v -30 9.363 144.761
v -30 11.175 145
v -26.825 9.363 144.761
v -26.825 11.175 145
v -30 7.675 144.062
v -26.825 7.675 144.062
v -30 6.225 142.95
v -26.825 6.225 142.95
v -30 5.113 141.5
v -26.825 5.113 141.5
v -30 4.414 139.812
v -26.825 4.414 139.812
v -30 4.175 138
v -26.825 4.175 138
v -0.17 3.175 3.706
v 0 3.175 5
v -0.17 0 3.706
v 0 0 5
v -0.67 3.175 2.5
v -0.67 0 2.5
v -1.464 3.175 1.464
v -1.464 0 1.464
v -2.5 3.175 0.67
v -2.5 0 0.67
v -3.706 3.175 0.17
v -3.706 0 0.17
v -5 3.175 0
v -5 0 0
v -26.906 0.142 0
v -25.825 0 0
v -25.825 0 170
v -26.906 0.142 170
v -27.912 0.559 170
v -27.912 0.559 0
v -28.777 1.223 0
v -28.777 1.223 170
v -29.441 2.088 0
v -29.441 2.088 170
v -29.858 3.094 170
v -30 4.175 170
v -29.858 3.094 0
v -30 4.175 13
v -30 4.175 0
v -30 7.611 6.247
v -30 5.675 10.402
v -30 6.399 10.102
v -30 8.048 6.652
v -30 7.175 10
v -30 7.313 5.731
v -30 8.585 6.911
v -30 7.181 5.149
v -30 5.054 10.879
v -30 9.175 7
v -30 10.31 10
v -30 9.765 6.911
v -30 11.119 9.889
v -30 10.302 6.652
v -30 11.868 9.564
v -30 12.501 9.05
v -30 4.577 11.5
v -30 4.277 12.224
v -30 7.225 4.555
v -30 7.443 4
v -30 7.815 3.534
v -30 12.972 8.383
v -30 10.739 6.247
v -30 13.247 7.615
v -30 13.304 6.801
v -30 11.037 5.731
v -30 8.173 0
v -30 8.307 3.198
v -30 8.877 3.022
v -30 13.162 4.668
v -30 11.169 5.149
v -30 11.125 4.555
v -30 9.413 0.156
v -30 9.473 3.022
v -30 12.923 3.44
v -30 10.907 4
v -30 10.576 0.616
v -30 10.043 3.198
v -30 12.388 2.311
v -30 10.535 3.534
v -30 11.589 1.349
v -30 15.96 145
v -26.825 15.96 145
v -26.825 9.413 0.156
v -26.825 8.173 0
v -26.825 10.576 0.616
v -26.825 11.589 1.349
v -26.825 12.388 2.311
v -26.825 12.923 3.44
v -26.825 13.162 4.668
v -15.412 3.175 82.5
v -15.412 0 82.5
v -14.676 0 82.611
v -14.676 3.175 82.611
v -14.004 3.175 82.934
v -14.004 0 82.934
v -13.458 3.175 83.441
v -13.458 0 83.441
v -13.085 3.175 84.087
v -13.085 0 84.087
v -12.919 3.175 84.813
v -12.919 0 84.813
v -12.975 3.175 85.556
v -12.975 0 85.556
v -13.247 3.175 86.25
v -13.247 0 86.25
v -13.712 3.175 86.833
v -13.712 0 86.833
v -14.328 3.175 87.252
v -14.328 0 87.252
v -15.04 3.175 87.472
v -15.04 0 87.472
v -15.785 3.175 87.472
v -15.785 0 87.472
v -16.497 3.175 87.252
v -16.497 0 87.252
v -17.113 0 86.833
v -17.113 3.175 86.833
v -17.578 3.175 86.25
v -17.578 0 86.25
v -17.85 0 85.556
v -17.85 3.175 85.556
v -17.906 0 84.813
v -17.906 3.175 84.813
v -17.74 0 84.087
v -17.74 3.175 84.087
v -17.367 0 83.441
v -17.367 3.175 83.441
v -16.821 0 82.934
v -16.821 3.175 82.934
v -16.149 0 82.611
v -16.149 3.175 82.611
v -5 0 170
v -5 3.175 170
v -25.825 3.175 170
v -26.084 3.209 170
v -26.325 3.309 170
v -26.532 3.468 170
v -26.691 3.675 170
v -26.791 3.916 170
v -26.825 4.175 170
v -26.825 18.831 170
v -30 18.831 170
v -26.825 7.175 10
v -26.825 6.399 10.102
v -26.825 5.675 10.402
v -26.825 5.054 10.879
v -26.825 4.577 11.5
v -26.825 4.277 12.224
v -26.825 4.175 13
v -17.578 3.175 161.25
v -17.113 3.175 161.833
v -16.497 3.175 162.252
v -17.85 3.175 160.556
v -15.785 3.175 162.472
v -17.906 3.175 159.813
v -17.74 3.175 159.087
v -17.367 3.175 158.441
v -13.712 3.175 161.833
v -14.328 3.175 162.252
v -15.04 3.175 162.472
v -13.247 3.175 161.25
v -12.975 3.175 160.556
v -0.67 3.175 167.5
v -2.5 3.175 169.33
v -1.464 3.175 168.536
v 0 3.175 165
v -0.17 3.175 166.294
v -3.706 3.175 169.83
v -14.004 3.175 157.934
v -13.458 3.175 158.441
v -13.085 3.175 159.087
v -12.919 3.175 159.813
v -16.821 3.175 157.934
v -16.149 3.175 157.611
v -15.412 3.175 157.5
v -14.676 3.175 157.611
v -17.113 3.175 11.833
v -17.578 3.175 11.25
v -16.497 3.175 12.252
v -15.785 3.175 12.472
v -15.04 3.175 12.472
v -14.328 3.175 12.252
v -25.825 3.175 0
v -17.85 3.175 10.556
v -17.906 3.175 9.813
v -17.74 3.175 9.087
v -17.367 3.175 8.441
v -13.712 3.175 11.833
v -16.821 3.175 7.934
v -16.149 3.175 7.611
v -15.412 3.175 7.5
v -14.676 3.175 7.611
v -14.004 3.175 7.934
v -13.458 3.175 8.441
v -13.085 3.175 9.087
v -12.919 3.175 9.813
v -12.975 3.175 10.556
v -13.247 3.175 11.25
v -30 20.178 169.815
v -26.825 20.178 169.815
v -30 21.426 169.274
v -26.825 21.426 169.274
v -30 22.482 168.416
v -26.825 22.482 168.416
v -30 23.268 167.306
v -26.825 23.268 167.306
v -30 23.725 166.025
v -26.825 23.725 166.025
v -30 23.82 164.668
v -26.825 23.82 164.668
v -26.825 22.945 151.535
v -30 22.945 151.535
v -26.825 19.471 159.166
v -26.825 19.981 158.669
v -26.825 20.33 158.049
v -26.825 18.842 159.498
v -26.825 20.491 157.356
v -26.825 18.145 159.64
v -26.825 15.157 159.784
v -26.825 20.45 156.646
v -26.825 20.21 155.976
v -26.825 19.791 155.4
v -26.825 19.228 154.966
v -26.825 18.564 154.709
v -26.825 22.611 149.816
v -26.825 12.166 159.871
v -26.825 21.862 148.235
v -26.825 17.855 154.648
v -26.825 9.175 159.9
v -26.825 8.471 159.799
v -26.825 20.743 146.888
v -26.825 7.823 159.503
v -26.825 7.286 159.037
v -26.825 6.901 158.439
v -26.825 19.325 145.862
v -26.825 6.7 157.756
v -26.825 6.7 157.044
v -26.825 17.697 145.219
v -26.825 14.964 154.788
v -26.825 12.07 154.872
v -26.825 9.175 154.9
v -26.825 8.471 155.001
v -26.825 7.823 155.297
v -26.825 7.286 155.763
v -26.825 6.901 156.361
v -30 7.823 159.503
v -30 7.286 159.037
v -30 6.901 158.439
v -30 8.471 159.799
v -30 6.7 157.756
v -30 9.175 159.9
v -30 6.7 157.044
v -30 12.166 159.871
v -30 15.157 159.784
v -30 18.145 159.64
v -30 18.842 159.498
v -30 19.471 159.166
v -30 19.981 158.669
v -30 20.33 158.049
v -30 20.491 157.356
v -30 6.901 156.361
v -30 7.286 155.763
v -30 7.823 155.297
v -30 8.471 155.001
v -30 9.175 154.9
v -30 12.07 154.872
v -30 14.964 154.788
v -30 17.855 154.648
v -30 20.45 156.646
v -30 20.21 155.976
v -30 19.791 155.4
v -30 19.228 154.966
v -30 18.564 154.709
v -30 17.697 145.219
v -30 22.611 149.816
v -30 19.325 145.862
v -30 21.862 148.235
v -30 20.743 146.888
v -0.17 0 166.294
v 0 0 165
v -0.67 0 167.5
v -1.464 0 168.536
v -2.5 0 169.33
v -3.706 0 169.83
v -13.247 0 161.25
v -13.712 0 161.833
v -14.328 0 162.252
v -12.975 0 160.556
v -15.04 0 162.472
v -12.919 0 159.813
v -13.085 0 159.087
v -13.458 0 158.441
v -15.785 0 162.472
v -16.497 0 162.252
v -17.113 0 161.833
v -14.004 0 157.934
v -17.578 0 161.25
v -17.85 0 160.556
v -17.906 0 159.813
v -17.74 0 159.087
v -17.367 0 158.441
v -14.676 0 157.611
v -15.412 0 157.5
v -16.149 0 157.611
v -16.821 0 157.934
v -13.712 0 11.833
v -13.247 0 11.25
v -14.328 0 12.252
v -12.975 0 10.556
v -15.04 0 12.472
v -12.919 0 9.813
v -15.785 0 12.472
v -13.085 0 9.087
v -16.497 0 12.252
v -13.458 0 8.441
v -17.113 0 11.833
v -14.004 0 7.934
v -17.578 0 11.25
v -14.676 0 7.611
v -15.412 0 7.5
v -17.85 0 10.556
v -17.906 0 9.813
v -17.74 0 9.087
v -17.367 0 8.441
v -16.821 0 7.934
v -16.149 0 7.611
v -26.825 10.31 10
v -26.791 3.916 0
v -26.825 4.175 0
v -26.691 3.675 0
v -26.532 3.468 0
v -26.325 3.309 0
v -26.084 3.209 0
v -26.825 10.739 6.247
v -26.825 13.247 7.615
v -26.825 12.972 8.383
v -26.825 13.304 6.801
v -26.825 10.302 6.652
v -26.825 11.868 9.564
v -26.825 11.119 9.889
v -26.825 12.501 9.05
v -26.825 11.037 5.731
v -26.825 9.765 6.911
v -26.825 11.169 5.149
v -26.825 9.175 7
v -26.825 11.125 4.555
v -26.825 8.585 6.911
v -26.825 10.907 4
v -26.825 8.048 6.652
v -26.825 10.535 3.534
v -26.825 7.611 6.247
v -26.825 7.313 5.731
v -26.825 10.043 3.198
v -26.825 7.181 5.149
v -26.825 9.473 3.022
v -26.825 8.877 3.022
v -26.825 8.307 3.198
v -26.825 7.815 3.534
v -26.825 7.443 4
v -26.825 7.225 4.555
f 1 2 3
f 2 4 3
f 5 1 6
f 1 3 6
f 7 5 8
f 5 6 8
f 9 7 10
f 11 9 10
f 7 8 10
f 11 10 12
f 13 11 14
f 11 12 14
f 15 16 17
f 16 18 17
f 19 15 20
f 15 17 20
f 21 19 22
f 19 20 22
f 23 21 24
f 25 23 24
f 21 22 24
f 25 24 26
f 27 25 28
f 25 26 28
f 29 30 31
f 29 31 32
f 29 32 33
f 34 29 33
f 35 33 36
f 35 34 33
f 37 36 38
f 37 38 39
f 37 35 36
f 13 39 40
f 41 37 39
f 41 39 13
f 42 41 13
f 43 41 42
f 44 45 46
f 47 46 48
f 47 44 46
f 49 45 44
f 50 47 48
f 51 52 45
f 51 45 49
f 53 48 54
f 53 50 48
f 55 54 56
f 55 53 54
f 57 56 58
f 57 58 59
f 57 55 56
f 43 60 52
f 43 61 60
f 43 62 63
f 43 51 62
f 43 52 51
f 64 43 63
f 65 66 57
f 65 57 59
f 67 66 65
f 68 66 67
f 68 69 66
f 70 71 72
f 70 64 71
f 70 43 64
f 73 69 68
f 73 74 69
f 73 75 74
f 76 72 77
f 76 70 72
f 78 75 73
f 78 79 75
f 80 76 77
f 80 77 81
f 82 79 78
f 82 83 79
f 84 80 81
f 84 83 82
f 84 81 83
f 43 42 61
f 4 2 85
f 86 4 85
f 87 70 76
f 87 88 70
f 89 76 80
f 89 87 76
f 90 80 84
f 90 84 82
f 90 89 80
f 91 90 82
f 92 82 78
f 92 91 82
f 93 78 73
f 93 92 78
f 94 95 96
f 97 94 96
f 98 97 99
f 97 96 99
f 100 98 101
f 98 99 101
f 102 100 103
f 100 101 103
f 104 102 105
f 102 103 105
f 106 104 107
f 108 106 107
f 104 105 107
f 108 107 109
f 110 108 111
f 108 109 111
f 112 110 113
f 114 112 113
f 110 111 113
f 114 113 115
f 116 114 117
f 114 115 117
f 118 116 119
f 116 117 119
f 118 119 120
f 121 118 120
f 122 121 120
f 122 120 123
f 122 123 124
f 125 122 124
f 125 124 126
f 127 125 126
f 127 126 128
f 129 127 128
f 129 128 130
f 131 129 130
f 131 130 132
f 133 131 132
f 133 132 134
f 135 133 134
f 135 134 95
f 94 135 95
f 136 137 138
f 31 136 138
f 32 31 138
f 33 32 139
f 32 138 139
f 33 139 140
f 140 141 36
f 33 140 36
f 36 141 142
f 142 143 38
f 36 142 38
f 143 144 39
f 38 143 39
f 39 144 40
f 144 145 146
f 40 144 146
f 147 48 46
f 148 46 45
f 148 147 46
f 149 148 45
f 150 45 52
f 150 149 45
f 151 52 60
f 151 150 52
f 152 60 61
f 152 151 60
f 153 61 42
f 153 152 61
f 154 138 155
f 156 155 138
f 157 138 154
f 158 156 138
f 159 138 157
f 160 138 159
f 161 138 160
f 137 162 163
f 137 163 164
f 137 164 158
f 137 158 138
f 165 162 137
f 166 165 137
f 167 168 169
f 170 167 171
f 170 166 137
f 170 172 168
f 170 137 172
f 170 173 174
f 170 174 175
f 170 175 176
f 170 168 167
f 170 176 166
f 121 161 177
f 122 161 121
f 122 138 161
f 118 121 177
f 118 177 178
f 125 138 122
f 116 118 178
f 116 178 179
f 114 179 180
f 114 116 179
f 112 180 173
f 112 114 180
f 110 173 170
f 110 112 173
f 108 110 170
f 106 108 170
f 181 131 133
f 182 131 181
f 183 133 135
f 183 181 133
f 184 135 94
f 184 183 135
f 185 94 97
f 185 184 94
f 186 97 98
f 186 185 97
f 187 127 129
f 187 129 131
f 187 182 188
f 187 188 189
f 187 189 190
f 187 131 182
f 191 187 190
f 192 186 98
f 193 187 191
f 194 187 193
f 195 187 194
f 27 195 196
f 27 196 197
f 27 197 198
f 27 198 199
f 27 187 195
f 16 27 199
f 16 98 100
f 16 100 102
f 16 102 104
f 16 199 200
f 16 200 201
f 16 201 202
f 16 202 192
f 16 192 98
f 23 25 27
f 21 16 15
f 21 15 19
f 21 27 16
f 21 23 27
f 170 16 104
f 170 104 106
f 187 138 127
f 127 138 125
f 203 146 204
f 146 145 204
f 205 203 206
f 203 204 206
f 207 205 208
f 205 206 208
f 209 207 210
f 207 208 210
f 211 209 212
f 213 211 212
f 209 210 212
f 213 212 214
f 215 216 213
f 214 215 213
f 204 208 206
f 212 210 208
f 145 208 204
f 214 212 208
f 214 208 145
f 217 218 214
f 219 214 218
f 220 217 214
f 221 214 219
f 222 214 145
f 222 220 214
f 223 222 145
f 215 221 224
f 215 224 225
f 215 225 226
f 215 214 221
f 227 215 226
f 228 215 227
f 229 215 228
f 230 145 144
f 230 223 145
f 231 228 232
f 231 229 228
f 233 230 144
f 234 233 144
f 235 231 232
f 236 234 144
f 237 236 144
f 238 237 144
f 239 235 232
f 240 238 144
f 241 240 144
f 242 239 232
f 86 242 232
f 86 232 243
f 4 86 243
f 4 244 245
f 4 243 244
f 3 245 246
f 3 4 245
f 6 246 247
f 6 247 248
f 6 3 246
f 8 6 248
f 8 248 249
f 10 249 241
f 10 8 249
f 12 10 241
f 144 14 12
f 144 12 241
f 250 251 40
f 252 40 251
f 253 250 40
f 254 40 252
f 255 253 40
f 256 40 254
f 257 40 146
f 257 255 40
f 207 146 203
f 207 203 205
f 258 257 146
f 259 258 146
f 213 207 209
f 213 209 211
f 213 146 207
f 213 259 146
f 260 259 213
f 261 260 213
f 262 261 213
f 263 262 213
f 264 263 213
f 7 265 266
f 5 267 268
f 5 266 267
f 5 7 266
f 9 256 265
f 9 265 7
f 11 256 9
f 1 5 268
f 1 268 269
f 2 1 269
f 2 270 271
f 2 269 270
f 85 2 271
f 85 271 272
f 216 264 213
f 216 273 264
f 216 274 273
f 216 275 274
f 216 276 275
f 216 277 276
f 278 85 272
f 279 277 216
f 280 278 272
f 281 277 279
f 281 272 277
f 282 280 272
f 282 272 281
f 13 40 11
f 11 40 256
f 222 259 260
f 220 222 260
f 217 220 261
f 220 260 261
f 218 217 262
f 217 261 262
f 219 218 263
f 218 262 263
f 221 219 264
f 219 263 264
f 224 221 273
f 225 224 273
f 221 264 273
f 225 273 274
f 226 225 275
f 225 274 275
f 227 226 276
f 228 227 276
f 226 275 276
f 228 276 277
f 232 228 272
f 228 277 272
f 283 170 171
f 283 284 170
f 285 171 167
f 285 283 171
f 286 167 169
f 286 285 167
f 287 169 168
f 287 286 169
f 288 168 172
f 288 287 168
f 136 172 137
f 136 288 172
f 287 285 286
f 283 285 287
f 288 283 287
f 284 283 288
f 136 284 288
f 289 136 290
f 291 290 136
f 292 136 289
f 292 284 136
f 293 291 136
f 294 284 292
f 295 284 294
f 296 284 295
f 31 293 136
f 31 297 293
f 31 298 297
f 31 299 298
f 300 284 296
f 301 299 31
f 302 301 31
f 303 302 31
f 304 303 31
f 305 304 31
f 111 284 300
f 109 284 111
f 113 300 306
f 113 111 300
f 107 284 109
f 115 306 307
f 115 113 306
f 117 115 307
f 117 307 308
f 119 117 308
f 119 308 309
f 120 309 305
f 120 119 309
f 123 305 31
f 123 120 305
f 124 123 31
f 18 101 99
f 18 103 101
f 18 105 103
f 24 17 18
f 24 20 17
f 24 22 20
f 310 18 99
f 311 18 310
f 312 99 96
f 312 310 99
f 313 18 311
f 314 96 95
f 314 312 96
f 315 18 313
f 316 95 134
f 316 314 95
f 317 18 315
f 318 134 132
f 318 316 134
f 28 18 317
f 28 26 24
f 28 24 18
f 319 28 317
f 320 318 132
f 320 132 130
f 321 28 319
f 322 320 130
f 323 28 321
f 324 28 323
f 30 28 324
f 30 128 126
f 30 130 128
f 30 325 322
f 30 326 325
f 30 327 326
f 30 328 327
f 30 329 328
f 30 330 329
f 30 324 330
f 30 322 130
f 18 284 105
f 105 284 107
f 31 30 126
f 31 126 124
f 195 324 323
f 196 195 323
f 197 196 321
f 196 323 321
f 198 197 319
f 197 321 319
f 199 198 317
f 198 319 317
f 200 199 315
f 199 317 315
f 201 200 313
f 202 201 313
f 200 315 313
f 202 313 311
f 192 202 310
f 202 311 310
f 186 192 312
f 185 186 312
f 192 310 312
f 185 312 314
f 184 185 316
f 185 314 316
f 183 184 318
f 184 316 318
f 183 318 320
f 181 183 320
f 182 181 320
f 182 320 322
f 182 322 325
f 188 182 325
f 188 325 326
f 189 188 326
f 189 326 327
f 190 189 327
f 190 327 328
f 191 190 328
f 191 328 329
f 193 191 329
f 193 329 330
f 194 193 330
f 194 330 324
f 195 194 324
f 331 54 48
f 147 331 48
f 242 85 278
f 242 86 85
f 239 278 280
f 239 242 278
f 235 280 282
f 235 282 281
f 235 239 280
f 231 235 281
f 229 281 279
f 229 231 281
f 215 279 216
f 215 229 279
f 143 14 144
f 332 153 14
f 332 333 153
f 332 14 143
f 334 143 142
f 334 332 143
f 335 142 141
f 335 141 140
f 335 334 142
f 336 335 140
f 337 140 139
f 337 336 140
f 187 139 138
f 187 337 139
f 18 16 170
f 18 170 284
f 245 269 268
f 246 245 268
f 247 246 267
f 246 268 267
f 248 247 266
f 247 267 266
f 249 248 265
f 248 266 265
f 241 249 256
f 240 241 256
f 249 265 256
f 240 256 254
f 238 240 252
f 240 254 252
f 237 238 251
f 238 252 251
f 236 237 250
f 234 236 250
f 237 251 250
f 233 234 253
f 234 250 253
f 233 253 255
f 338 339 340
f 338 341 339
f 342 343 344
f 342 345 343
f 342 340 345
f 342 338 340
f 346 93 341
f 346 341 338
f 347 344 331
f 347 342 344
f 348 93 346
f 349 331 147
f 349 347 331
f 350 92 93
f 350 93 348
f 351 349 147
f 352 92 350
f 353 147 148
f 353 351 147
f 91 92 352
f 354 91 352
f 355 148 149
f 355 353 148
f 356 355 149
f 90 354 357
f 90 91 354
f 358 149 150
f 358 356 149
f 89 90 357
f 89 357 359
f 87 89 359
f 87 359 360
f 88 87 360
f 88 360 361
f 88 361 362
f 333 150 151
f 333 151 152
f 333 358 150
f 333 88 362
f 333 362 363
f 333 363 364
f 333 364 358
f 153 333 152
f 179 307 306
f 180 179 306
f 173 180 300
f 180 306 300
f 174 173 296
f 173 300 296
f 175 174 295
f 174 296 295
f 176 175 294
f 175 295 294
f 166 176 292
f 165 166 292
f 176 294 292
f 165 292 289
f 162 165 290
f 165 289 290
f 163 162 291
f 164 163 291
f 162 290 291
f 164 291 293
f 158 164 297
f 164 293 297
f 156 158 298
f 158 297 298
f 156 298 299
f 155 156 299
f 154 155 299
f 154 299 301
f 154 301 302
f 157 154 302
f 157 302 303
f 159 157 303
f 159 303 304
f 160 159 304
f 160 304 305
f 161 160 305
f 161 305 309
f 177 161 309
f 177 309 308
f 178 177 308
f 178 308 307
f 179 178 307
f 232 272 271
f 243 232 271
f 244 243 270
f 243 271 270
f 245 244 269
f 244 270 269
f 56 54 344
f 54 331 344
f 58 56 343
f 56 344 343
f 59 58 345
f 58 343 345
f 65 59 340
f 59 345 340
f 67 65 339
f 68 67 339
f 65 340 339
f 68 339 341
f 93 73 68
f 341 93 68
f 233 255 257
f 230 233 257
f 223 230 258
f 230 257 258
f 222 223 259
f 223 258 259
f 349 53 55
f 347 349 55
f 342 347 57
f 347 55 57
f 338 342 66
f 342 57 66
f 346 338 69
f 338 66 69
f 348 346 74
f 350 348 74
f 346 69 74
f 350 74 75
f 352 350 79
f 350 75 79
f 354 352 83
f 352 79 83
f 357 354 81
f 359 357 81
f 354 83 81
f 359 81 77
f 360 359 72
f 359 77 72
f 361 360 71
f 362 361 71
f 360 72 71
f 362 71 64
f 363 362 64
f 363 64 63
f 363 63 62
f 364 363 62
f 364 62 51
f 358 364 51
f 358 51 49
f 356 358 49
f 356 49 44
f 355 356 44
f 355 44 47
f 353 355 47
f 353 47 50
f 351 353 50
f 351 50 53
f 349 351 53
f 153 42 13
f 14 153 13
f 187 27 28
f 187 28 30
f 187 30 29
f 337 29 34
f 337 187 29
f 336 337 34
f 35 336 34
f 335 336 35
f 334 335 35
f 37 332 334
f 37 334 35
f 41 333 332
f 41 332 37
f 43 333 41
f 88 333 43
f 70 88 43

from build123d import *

# Parameters (mm, degrees)
BASE_FLANGE1_DEPTH = 170
FILLET1_R          = 5
SKETCH6_R          = 2
CUT_EXTRUDE1_DEPTH = 178.200451467
SKETCH7_R          = 2.5
CUT_EXTRUDE2_DEPTH = 178.200451467
CUT_EXTRUDE3_DEPTH = 178.200451467
FILLET2_R          = 5
CUT_EXTRUDE4_DEPTH = 175.263907966
FILLET3_R          = 3
FILLET4_R          = 7


# Sheet-metal steps are written as plain solids
with BuildPart() as part:
    # Sketch1 → Base-Flange1 (new body)
    with BuildSketch(Plane.XY):
        with BuildLine():
            Line((0, 0), (-25.825, 0))
            ThreePointArc((-25.825, 0), (-28.777170811, 1.222829189), (-30, 4.175))
            Line((-30, 4.175), (-30, 40))
            Line((-30, 40), (-26.825, 40))
            Line((-26.825, 40), (-26.825, 4.175))
            ThreePointArc((-26.825, 4.175), (-26.532106781, 3.467893219), (-25.825, 3.175))
            Line((-25.825, 3.175), (0, 3.175))
            Line((0, 3.175), (0, 0))
        make_face()
    extrude(amount=BASE_FLANGE1_DEPTH)

    # Fillet1
    fillet1_edges = [part.edges().sort_by_distance(p)[0] for p in [
        (0, 1.5875, 170),
        (0, 1.5875, 0),
        (-28.4125, 40, 170),
        (-28.4125, 40, 0),
    ]]
    fillet(fillet1_edges, radius=FILLET1_R)

    # Sketch6 → Cut-Extrude1 (cut, through all)
    with BuildSketch(Plane.ZY.offset(30)):
        with Locations((5, 9.175)):
            Circle(SKETCH6_R)
        with BuildLine():
            ThreePointArc((159.9, 9.175), (159.835005505, 13.661766133), (159.640076561, 18.14476706))
            ThreePointArc((159.640076561, 18.14476706), (156.999504521, 20.49580498), (154.648466601, 17.85523294))
            ThreePointArc((154.648466601, 17.85523294), (154.837103455, 13.516938304), (154.9, 9.175))
            ThreePointArc((154.9, 9.175), (157.4, 6.675), (159.9, 9.175))
        make_face()
    extrude(amount=-CUT_EXTRUDE1_DEPTH, mode=Mode.SUBTRACT)

    # Sketch7 → Cut-Extrude2 (cut, through all)
    with BuildSketch(Plane.XZ):
        with Locations(Location((-15.4125, 160, 0), (0, 0, 270))):
            Circle(SKETCH7_R)
        with Locations(Location((-15.4125, 85, 0), (0, 0, 270))):
            Circle(SKETCH7_R)
        with Locations(Location((-15.4125, 10, 0), (0, 0, 270))):
            Circle(SKETCH7_R)
    extrude(amount=-CUT_EXTRUDE2_DEPTH, mode=Mode.SUBTRACT)

    # Sketch8 → Cut-Extrude3 (cut, through all)
    with BuildSketch(Plane.ZY.offset(30)):
        with BuildLine():
            Line((0, 12.85080004), (170, 24.175))
            Line((170, 24.175), (170, 35))
            ThreePointArc((170, 35), (168.535533906, 38.535533906), (165, 40))
            Line((165, 40), (5, 40))
            ThreePointArc((5, 40), (1.464466094, 38.535533906), (0, 35))
            Line((0, 35), (0, 12.85080004))
        make_face()
    extrude(amount=-CUT_EXTRUDE3_DEPTH, mode=Mode.SUBTRACT)

    # Fillet2
    fillet2_edges = [part.edges().sort_by_distance(p)[0] for p in [
        (-28.4125, 24.175, 170),
        (-28.4125, 12.85080004, 0),
    ]]
    fillet(fillet2_edges, radius=FILLET2_R)

    # Sketch9 → Cut-Extrude4 (cut, through all)
    with BuildSketch(Plane.ZY.offset(30)):
        Polygon((10, 13.51692945), (10, 4.175), (145, 4.175), (145, 22.509676476), align=None)
    extrude(amount=-CUT_EXTRUDE4_DEPTH, mode=Mode.SUBTRACT)

    # Fillet3
    fillet3_edges = [part.edges().sort_by_distance(p)[0] for p in [
        (-28.4125, 4.175, 10),
        (-28.4125, 13.51692945, 10),
    ]]
    fillet(fillet3_edges, radius=FILLET3_R)

    # Fillet4
    fillet4_edges = [part.edges().sort_by_distance(p)[0] for p in [
        (-28.4125, 22.509676476, 145),
        (-28.4125, 4.175, 145),
    ]]
    fillet(fillet4_edges, radius=FILLET4_R)


solid = part.part
